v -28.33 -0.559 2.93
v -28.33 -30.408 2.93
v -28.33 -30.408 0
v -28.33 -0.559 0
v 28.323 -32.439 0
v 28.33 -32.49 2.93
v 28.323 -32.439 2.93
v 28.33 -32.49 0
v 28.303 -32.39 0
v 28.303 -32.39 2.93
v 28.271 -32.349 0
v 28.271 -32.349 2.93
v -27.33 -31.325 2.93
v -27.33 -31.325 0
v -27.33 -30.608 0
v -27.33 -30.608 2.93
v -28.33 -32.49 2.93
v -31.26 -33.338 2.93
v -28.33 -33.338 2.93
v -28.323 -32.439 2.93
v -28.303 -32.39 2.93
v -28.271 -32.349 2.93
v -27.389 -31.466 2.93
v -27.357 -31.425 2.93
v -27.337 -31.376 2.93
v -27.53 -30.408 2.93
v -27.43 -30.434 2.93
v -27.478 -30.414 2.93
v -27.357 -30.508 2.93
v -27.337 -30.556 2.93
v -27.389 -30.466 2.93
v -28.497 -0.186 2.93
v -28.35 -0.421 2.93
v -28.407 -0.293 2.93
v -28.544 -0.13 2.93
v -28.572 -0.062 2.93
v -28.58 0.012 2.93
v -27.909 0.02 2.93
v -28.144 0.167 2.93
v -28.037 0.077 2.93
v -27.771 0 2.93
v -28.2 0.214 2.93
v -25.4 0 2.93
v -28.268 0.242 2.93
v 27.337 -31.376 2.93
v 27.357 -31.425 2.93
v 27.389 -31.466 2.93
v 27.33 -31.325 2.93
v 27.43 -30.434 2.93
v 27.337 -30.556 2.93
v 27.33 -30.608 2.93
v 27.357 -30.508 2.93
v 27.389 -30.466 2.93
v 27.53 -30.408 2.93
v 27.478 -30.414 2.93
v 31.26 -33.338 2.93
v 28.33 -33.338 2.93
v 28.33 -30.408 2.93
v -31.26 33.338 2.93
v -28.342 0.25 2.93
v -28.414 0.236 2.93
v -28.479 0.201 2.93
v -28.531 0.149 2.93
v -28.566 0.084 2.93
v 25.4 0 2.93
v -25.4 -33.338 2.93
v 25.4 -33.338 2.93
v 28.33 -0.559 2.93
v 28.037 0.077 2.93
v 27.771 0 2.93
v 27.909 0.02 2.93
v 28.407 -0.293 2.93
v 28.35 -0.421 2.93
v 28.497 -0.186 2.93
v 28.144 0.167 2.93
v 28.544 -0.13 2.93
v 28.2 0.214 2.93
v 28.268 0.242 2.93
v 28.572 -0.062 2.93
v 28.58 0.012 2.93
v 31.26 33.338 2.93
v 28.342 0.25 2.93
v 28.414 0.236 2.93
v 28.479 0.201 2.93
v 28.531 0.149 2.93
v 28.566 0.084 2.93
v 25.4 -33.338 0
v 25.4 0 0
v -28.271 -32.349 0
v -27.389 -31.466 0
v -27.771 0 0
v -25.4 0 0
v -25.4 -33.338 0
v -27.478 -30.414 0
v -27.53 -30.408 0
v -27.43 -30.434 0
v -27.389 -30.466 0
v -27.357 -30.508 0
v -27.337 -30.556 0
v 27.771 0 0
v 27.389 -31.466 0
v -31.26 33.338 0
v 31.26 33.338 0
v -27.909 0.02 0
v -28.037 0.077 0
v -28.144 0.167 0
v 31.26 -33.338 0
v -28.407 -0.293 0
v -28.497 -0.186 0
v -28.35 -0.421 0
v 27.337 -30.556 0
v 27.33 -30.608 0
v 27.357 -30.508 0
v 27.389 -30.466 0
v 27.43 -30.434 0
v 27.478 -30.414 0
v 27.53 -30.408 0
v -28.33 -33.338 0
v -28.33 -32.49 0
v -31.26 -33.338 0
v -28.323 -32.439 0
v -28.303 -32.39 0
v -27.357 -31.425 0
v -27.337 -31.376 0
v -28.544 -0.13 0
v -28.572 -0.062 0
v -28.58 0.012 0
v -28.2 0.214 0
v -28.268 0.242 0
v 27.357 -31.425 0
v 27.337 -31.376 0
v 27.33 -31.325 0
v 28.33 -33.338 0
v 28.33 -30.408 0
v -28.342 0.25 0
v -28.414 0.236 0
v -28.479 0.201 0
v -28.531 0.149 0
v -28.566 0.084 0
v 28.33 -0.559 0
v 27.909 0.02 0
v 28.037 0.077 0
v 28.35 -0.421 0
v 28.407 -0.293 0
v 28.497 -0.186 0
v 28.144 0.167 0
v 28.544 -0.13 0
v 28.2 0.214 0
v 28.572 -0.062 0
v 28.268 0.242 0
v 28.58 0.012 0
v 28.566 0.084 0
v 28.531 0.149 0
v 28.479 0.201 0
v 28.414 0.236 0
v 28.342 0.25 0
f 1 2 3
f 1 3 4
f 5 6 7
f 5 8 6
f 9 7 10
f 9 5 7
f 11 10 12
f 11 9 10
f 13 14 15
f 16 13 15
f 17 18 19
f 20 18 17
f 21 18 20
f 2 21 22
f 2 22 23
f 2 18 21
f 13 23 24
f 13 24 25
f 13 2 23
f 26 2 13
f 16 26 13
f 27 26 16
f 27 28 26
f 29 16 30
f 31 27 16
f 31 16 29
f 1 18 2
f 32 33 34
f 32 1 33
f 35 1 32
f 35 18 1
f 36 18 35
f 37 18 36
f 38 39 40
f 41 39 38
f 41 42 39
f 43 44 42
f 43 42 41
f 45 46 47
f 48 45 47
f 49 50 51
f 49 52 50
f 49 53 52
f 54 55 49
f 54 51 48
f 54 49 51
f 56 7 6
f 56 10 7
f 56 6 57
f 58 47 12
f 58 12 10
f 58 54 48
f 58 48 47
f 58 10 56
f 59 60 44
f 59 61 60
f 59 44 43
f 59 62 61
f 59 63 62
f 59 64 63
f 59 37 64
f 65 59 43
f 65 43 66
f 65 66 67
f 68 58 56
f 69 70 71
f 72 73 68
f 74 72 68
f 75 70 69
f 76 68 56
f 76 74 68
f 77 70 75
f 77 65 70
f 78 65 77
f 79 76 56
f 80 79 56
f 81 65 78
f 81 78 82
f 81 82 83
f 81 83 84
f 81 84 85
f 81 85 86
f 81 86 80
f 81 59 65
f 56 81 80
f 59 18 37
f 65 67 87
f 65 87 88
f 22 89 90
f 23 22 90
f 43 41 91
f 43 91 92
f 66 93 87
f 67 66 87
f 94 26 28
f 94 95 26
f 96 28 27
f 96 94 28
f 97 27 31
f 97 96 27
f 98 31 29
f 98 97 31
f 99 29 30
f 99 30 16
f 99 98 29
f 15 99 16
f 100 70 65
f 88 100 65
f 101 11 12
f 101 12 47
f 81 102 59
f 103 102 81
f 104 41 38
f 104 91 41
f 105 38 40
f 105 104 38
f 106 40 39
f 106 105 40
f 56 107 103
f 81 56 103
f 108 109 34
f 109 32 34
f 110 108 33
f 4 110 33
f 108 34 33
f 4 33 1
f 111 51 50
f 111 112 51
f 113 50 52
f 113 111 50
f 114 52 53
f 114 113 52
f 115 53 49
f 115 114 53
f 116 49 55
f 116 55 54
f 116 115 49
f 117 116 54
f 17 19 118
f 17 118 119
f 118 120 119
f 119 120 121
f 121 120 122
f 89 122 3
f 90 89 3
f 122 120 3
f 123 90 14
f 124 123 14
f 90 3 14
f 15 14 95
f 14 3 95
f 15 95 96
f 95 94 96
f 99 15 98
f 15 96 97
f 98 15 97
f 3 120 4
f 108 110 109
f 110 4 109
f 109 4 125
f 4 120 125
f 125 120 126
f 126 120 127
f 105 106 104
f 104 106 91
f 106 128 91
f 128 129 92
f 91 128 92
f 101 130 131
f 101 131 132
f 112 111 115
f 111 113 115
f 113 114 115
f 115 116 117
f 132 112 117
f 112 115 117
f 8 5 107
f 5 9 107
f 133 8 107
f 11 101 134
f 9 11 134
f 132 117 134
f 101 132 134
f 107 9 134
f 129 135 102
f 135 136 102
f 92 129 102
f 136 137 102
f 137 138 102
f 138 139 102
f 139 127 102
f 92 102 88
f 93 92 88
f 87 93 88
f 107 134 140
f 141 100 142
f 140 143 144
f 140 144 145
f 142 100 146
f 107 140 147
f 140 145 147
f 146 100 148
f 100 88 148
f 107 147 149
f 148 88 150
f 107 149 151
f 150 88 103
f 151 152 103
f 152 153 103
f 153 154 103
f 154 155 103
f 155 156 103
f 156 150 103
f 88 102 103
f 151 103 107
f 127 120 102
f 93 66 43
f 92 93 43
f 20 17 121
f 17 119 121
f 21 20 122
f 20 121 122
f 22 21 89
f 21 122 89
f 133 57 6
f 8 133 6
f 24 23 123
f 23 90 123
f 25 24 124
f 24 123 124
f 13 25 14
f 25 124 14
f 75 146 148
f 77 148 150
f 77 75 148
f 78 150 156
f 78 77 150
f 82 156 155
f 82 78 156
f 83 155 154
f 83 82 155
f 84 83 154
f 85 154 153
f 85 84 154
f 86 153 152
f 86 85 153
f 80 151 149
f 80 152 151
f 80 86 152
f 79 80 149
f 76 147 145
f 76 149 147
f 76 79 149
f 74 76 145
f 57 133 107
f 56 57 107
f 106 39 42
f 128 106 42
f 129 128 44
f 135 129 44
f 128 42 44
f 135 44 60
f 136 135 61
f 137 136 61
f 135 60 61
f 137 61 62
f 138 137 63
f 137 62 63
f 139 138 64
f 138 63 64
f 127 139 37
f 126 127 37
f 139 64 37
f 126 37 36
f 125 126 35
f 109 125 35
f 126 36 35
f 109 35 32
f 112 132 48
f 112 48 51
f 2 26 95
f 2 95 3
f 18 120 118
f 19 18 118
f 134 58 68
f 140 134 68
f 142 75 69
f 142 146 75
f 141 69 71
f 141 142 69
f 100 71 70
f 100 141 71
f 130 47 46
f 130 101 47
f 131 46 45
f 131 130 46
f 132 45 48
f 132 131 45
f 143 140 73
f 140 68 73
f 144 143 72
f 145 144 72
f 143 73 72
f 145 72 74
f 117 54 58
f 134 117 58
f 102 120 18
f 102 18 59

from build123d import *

# Parameters (mm, degrees)
SKETCH1_W            = 62.519999928
SKETCH1_H            = 66.675
BOSS_EXTRUDE1_DEPTH  = 2.929999982
SKETCH2_W            = 2.929999982
SKETCH2_H            = 33.3375
CUT_EXTRUDE1_DEPTH   = 3.929999982
BOSS_EXTRUDE2_DEPTH  = 2.93
FILLET1_R            = 0.2
SKETCH5_R            = 0.25
CUT_EXTRUDE2_DEPTH   = 3.93
FILLET2_R            = 0.5
FILLET1_OF_MIRROR1_R = 0.2
FILLET2_OF_MIRROR1_R = 0.5


with BuildPart() as part:
    # Sketch1 → Boss-Extrude1 (new body)
    with BuildSketch(Plane.XY):
        Rectangle(SKETCH1_W, SKETCH1_H)
    extrude(amount=BOSS_EXTRUDE1_DEPTH)

    # Sketch2 → Cut-Extrude1 (cut, through all)
    with BuildSketch(Plane.XY.offset(2.929999982)):
        with Locations((-26.864999991, -16.66875)):
            Rectangle(SKETCH2_W, SKETCH2_H)
    cut_extrude1 = extrude(amount=-CUT_EXTRUDE1_DEPTH, mode=Mode.SUBTRACT)

    # Sketch4 → Boss-Extrude2 (add)
    with BuildSketch(Plane.XY.offset(2.929999982)):
        Polygon((-27.330001982, -30.407500018), (-28.329999982, -30.407500018), (-28.329999982, -32.407498018), (-27.330001982, -31.407500018), align=None)
    boss_extrude2 = extrude(amount=-BOSS_EXTRUDE2_DEPTH)

    # Fillet1
    fillet1_edges = [part.edges().sort_by_distance(p)[0] for p in [
        (-27.330001982, -30.407500018, 1.464999982),
        (-28.329999982, -32.407498018, 1.464999982),
        (-27.330001982, -31.407500018, 1.464999982),
    ]]
    fillet(fillet1_edges, radius=FILLET1_R)

    # Sketch5 → Cut-Extrude2 (cut, through all)
    with BuildSketch(Plane.XY.offset(2.929999982)):
        with Locations((-28.329999982, 0)):
            Circle(SKETCH5_R)
    cut_extrude2 = extrude(amount=-CUT_EXTRUDE2_DEPTH, mode=Mode.SUBTRACT)

    # Fillet2
    fillet2_edges = [part.edges().sort_by_distance(p)[0] for p in [
        (-28.079999982, 0, 1.464999991),
        (-28.329999982, -0.25, 1.464999991),
    ]]
    fillet(fillet2_edges, radius=FILLET2_R)

    # Mirror1: Cut-Extrude1, Boss-Extrude2, Cut-Extrude2 across plane
    add(cut_extrude1.mirror(Plane(origin=(0, 0, 0), x_dir=(0, 0, 1), z_dir=(1, 0, 0))), mode=Mode.SUBTRACT)
    add(boss_extrude2.mirror(Plane(origin=(0, 0, 0), x_dir=(0, 0, 1), z_dir=(1, 0, 0))))
    add(cut_extrude2.mirror(Plane(origin=(0, 0, 0), x_dir=(0, 0, 1), z_dir=(1, 0, 0))), mode=Mode.SUBTRACT)

    # Fillet1 of Mirror1
    fillet1_of_mirror1_edges = [part.edges().sort_by_distance(p)[0] for p in [
        (27.330001982, -30.407500018, 1.464999982),
        (28.329999982, -32.407498018, 1.464999982),
        (27.330001982, -31.407500018, 1.464999982),
    ]]
    fillet(fillet1_of_mirror1_edges, radius=FILLET1_OF_MIRROR1_R)

    # Fillet2 of Mirror1
    fillet2_of_mirror1_edges = [part.edges().sort_by_distance(p)[0] for p in [
        (28.079999982, 0, 1.464999991),
        (28.329999982, -0.25, 1.464999991),
    ]]
    fillet(fillet2_of_mirror1_edges, radius=FILLET2_OF_MIRROR1_R)


solid = part.part
